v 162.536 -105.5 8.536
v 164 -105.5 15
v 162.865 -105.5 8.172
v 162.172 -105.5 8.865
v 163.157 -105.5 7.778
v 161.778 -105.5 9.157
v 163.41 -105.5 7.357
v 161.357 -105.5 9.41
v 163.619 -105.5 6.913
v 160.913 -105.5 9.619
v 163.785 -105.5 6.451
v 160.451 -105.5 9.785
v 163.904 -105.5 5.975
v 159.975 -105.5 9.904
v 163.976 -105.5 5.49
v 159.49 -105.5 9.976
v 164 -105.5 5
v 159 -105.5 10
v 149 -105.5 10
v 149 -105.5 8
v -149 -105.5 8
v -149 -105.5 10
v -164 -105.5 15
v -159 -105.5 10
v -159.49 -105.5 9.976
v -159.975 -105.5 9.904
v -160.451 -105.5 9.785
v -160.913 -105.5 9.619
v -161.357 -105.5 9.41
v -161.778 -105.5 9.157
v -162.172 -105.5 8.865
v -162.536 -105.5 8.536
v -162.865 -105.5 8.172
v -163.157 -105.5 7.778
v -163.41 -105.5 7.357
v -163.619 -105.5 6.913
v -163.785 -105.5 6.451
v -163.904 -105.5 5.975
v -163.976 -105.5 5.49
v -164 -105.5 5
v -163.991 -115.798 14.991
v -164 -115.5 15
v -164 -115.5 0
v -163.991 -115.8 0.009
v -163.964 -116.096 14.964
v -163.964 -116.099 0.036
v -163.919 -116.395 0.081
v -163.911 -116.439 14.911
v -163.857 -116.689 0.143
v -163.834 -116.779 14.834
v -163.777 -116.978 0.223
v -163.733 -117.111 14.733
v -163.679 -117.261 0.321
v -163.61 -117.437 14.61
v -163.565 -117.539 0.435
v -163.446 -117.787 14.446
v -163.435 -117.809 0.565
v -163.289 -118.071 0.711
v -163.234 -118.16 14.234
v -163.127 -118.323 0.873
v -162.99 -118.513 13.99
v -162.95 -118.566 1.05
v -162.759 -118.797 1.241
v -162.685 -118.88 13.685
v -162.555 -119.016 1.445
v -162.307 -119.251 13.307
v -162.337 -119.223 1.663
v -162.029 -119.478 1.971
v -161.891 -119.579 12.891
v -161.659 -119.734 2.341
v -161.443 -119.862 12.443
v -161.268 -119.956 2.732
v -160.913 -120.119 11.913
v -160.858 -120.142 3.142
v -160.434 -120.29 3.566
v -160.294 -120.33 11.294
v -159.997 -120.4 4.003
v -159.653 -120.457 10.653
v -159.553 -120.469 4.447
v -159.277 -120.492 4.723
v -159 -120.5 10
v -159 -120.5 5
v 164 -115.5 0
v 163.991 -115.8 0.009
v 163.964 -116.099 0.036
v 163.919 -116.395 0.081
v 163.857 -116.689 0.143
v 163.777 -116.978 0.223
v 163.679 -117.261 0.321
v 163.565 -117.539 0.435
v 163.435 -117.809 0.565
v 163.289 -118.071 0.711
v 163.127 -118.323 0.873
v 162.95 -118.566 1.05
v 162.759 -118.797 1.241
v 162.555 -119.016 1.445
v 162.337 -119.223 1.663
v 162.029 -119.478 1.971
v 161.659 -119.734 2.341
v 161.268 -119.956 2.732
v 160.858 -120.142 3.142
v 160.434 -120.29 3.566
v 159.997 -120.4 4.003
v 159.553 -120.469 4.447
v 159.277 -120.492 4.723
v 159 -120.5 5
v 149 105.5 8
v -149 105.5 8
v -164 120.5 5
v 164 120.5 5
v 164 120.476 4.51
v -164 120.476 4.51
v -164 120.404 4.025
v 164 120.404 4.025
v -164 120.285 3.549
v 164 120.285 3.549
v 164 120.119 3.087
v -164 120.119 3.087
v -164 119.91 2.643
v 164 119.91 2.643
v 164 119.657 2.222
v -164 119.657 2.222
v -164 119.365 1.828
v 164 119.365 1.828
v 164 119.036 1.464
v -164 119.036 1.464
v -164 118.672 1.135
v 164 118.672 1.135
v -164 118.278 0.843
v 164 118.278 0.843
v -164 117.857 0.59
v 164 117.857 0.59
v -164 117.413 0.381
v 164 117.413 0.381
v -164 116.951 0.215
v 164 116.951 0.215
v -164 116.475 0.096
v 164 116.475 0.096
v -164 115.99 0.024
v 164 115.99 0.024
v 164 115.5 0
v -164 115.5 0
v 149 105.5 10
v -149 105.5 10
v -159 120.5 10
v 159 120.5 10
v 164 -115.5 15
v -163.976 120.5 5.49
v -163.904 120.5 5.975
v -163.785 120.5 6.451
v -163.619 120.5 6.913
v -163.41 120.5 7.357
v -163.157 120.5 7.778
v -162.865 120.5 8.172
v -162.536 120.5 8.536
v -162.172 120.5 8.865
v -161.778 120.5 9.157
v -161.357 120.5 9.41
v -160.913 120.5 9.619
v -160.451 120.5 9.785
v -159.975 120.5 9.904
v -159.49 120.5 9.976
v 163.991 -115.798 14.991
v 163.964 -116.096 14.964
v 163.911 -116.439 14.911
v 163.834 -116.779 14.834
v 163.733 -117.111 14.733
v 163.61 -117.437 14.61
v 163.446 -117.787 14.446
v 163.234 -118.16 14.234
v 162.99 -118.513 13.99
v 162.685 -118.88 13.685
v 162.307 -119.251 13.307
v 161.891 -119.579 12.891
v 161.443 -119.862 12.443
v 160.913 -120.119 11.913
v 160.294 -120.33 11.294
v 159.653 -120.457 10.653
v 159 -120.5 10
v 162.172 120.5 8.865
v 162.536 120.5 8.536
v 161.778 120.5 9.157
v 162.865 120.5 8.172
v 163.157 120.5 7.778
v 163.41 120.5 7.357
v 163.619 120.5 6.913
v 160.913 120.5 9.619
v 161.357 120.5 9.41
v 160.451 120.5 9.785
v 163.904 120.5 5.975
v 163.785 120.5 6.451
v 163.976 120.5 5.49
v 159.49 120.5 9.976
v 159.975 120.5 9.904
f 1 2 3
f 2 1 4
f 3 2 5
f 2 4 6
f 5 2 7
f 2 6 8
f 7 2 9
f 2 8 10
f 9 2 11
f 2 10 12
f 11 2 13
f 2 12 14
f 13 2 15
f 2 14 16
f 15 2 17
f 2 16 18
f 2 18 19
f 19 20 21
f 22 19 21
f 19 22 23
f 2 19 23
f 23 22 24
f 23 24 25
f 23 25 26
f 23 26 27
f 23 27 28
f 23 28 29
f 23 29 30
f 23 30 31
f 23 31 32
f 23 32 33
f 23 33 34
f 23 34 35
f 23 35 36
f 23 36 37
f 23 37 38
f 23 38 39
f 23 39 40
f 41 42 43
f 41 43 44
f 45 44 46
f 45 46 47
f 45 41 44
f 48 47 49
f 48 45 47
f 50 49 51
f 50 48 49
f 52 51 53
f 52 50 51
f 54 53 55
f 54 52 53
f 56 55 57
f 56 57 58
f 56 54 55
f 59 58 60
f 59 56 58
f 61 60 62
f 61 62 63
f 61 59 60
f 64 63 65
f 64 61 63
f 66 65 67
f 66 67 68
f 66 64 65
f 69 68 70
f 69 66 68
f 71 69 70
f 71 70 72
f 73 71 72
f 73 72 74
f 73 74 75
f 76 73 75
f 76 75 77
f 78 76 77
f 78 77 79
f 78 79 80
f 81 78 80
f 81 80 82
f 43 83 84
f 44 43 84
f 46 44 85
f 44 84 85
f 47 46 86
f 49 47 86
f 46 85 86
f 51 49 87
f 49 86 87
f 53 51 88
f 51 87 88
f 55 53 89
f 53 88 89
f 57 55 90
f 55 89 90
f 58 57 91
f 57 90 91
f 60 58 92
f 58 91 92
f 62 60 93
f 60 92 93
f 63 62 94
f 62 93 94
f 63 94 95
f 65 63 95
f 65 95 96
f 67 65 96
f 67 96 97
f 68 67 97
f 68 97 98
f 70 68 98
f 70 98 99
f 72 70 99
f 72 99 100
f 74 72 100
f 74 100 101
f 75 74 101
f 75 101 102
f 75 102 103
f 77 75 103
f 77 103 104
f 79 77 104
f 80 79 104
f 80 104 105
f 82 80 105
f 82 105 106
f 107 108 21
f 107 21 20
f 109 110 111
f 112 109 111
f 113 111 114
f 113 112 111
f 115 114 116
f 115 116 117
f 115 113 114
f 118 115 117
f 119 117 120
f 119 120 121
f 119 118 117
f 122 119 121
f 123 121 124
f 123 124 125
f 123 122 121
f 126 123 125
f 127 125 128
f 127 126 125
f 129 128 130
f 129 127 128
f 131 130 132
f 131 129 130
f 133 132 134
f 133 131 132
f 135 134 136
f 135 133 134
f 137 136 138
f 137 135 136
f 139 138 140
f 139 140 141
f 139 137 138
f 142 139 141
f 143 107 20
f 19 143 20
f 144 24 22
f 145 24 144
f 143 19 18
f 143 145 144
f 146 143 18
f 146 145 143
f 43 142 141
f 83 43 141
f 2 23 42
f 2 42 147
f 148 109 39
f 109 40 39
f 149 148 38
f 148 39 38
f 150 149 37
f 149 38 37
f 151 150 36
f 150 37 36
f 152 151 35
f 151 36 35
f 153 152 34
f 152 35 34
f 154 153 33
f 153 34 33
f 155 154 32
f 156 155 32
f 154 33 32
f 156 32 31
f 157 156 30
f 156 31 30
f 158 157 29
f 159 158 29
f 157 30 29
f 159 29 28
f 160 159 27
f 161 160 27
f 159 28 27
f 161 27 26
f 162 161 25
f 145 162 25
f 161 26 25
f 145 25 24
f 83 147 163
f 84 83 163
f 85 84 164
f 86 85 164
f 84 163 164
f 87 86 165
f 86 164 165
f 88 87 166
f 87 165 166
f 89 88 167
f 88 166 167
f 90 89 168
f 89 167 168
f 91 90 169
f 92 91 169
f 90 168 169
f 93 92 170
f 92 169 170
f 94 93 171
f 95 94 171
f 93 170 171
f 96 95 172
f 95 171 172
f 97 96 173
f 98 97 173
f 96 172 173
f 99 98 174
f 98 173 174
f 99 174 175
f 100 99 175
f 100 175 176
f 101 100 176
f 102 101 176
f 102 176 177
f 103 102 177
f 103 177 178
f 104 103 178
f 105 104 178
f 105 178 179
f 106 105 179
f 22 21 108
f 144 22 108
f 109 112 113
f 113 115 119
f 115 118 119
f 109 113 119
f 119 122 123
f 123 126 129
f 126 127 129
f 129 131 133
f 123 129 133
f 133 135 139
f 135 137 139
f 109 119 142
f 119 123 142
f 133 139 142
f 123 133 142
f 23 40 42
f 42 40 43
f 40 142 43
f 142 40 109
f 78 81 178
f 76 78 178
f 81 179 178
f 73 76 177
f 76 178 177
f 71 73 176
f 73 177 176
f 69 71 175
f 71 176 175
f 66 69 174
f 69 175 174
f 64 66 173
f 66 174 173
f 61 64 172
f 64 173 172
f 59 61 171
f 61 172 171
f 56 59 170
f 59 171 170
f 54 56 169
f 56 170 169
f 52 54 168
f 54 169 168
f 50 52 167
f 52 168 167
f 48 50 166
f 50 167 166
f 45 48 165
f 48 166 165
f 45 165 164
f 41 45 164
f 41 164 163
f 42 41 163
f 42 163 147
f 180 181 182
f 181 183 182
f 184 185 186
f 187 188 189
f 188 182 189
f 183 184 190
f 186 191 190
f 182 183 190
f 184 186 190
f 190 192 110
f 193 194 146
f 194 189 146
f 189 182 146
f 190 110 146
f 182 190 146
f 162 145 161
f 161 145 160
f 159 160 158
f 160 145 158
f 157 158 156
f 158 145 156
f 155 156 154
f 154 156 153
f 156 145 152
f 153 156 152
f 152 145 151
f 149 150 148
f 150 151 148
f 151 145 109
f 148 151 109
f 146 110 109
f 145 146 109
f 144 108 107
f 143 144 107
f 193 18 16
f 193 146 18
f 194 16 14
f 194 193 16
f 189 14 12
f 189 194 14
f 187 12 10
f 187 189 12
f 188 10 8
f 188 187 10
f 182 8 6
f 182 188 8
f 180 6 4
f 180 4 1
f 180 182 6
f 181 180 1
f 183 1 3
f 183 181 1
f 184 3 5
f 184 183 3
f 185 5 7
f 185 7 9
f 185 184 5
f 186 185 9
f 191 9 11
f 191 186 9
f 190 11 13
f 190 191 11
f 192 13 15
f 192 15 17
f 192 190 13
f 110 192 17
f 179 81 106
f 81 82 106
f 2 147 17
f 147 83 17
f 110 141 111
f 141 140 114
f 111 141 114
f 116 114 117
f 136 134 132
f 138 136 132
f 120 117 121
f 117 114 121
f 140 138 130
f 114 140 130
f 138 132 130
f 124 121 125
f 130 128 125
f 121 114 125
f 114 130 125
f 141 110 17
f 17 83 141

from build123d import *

# Parameters (mm, degrees)
F1_DEPTH = 10
F0_W     = 298
F0_H     = 211
F2_DEPTH = 8
F3_DEPTH = 15
F4_R     = 4.99999


# Not quite as in the source:
# - a fillet or chamfer is up to 0.001 mm smaller than in the source, because OpenCascade refuses the exact size


with BuildPart() as f1:
    # F0 (on Top) → F1 (new body)
    with BuildSketch(Plane.XY):
        Polygon((-149, -105.5), (-149, 105.5), (149, 105.5), (149, -105.5), (164, -105.5), (164, 120.5), (-164, 120.5), (-164, -105.5), align=None)
    extrude(amount=F1_DEPTH)

    # F0 (on Top) → F2 (join)
    with BuildSketch(Plane.XY):
        Rectangle(F0_W, F0_H)
    extrude(amount=F2_DEPTH)

    # F0 (on Top) → F3 (join)
    with BuildSketch(Plane.XY):
        Polygon((149, -105.5), (-149, -105.5), (-164, -105.5), (-164, -120.5), (164, -120.5), (164, -105.5), align=None)
    extrude(amount=F3_DEPTH)

    # F4 (radius 5 in the source; OpenCascade refuses exactly that, so slightly less here)
    f4_edges = [f1.edges().sort_by_distance(p)[0] for p in [
        (0, 120.5, 0),
        (-164, 7.5, 10),
        (164, 7.5, 10),
        (0, -120.5, 15),
        (164, -120.5, 7.5),
        (-164, -120.5, 7.5),
        (0, -120.5, 0),
    ]]
    fillet(f4_edges, radius=F4_R)


solid = f1.part
